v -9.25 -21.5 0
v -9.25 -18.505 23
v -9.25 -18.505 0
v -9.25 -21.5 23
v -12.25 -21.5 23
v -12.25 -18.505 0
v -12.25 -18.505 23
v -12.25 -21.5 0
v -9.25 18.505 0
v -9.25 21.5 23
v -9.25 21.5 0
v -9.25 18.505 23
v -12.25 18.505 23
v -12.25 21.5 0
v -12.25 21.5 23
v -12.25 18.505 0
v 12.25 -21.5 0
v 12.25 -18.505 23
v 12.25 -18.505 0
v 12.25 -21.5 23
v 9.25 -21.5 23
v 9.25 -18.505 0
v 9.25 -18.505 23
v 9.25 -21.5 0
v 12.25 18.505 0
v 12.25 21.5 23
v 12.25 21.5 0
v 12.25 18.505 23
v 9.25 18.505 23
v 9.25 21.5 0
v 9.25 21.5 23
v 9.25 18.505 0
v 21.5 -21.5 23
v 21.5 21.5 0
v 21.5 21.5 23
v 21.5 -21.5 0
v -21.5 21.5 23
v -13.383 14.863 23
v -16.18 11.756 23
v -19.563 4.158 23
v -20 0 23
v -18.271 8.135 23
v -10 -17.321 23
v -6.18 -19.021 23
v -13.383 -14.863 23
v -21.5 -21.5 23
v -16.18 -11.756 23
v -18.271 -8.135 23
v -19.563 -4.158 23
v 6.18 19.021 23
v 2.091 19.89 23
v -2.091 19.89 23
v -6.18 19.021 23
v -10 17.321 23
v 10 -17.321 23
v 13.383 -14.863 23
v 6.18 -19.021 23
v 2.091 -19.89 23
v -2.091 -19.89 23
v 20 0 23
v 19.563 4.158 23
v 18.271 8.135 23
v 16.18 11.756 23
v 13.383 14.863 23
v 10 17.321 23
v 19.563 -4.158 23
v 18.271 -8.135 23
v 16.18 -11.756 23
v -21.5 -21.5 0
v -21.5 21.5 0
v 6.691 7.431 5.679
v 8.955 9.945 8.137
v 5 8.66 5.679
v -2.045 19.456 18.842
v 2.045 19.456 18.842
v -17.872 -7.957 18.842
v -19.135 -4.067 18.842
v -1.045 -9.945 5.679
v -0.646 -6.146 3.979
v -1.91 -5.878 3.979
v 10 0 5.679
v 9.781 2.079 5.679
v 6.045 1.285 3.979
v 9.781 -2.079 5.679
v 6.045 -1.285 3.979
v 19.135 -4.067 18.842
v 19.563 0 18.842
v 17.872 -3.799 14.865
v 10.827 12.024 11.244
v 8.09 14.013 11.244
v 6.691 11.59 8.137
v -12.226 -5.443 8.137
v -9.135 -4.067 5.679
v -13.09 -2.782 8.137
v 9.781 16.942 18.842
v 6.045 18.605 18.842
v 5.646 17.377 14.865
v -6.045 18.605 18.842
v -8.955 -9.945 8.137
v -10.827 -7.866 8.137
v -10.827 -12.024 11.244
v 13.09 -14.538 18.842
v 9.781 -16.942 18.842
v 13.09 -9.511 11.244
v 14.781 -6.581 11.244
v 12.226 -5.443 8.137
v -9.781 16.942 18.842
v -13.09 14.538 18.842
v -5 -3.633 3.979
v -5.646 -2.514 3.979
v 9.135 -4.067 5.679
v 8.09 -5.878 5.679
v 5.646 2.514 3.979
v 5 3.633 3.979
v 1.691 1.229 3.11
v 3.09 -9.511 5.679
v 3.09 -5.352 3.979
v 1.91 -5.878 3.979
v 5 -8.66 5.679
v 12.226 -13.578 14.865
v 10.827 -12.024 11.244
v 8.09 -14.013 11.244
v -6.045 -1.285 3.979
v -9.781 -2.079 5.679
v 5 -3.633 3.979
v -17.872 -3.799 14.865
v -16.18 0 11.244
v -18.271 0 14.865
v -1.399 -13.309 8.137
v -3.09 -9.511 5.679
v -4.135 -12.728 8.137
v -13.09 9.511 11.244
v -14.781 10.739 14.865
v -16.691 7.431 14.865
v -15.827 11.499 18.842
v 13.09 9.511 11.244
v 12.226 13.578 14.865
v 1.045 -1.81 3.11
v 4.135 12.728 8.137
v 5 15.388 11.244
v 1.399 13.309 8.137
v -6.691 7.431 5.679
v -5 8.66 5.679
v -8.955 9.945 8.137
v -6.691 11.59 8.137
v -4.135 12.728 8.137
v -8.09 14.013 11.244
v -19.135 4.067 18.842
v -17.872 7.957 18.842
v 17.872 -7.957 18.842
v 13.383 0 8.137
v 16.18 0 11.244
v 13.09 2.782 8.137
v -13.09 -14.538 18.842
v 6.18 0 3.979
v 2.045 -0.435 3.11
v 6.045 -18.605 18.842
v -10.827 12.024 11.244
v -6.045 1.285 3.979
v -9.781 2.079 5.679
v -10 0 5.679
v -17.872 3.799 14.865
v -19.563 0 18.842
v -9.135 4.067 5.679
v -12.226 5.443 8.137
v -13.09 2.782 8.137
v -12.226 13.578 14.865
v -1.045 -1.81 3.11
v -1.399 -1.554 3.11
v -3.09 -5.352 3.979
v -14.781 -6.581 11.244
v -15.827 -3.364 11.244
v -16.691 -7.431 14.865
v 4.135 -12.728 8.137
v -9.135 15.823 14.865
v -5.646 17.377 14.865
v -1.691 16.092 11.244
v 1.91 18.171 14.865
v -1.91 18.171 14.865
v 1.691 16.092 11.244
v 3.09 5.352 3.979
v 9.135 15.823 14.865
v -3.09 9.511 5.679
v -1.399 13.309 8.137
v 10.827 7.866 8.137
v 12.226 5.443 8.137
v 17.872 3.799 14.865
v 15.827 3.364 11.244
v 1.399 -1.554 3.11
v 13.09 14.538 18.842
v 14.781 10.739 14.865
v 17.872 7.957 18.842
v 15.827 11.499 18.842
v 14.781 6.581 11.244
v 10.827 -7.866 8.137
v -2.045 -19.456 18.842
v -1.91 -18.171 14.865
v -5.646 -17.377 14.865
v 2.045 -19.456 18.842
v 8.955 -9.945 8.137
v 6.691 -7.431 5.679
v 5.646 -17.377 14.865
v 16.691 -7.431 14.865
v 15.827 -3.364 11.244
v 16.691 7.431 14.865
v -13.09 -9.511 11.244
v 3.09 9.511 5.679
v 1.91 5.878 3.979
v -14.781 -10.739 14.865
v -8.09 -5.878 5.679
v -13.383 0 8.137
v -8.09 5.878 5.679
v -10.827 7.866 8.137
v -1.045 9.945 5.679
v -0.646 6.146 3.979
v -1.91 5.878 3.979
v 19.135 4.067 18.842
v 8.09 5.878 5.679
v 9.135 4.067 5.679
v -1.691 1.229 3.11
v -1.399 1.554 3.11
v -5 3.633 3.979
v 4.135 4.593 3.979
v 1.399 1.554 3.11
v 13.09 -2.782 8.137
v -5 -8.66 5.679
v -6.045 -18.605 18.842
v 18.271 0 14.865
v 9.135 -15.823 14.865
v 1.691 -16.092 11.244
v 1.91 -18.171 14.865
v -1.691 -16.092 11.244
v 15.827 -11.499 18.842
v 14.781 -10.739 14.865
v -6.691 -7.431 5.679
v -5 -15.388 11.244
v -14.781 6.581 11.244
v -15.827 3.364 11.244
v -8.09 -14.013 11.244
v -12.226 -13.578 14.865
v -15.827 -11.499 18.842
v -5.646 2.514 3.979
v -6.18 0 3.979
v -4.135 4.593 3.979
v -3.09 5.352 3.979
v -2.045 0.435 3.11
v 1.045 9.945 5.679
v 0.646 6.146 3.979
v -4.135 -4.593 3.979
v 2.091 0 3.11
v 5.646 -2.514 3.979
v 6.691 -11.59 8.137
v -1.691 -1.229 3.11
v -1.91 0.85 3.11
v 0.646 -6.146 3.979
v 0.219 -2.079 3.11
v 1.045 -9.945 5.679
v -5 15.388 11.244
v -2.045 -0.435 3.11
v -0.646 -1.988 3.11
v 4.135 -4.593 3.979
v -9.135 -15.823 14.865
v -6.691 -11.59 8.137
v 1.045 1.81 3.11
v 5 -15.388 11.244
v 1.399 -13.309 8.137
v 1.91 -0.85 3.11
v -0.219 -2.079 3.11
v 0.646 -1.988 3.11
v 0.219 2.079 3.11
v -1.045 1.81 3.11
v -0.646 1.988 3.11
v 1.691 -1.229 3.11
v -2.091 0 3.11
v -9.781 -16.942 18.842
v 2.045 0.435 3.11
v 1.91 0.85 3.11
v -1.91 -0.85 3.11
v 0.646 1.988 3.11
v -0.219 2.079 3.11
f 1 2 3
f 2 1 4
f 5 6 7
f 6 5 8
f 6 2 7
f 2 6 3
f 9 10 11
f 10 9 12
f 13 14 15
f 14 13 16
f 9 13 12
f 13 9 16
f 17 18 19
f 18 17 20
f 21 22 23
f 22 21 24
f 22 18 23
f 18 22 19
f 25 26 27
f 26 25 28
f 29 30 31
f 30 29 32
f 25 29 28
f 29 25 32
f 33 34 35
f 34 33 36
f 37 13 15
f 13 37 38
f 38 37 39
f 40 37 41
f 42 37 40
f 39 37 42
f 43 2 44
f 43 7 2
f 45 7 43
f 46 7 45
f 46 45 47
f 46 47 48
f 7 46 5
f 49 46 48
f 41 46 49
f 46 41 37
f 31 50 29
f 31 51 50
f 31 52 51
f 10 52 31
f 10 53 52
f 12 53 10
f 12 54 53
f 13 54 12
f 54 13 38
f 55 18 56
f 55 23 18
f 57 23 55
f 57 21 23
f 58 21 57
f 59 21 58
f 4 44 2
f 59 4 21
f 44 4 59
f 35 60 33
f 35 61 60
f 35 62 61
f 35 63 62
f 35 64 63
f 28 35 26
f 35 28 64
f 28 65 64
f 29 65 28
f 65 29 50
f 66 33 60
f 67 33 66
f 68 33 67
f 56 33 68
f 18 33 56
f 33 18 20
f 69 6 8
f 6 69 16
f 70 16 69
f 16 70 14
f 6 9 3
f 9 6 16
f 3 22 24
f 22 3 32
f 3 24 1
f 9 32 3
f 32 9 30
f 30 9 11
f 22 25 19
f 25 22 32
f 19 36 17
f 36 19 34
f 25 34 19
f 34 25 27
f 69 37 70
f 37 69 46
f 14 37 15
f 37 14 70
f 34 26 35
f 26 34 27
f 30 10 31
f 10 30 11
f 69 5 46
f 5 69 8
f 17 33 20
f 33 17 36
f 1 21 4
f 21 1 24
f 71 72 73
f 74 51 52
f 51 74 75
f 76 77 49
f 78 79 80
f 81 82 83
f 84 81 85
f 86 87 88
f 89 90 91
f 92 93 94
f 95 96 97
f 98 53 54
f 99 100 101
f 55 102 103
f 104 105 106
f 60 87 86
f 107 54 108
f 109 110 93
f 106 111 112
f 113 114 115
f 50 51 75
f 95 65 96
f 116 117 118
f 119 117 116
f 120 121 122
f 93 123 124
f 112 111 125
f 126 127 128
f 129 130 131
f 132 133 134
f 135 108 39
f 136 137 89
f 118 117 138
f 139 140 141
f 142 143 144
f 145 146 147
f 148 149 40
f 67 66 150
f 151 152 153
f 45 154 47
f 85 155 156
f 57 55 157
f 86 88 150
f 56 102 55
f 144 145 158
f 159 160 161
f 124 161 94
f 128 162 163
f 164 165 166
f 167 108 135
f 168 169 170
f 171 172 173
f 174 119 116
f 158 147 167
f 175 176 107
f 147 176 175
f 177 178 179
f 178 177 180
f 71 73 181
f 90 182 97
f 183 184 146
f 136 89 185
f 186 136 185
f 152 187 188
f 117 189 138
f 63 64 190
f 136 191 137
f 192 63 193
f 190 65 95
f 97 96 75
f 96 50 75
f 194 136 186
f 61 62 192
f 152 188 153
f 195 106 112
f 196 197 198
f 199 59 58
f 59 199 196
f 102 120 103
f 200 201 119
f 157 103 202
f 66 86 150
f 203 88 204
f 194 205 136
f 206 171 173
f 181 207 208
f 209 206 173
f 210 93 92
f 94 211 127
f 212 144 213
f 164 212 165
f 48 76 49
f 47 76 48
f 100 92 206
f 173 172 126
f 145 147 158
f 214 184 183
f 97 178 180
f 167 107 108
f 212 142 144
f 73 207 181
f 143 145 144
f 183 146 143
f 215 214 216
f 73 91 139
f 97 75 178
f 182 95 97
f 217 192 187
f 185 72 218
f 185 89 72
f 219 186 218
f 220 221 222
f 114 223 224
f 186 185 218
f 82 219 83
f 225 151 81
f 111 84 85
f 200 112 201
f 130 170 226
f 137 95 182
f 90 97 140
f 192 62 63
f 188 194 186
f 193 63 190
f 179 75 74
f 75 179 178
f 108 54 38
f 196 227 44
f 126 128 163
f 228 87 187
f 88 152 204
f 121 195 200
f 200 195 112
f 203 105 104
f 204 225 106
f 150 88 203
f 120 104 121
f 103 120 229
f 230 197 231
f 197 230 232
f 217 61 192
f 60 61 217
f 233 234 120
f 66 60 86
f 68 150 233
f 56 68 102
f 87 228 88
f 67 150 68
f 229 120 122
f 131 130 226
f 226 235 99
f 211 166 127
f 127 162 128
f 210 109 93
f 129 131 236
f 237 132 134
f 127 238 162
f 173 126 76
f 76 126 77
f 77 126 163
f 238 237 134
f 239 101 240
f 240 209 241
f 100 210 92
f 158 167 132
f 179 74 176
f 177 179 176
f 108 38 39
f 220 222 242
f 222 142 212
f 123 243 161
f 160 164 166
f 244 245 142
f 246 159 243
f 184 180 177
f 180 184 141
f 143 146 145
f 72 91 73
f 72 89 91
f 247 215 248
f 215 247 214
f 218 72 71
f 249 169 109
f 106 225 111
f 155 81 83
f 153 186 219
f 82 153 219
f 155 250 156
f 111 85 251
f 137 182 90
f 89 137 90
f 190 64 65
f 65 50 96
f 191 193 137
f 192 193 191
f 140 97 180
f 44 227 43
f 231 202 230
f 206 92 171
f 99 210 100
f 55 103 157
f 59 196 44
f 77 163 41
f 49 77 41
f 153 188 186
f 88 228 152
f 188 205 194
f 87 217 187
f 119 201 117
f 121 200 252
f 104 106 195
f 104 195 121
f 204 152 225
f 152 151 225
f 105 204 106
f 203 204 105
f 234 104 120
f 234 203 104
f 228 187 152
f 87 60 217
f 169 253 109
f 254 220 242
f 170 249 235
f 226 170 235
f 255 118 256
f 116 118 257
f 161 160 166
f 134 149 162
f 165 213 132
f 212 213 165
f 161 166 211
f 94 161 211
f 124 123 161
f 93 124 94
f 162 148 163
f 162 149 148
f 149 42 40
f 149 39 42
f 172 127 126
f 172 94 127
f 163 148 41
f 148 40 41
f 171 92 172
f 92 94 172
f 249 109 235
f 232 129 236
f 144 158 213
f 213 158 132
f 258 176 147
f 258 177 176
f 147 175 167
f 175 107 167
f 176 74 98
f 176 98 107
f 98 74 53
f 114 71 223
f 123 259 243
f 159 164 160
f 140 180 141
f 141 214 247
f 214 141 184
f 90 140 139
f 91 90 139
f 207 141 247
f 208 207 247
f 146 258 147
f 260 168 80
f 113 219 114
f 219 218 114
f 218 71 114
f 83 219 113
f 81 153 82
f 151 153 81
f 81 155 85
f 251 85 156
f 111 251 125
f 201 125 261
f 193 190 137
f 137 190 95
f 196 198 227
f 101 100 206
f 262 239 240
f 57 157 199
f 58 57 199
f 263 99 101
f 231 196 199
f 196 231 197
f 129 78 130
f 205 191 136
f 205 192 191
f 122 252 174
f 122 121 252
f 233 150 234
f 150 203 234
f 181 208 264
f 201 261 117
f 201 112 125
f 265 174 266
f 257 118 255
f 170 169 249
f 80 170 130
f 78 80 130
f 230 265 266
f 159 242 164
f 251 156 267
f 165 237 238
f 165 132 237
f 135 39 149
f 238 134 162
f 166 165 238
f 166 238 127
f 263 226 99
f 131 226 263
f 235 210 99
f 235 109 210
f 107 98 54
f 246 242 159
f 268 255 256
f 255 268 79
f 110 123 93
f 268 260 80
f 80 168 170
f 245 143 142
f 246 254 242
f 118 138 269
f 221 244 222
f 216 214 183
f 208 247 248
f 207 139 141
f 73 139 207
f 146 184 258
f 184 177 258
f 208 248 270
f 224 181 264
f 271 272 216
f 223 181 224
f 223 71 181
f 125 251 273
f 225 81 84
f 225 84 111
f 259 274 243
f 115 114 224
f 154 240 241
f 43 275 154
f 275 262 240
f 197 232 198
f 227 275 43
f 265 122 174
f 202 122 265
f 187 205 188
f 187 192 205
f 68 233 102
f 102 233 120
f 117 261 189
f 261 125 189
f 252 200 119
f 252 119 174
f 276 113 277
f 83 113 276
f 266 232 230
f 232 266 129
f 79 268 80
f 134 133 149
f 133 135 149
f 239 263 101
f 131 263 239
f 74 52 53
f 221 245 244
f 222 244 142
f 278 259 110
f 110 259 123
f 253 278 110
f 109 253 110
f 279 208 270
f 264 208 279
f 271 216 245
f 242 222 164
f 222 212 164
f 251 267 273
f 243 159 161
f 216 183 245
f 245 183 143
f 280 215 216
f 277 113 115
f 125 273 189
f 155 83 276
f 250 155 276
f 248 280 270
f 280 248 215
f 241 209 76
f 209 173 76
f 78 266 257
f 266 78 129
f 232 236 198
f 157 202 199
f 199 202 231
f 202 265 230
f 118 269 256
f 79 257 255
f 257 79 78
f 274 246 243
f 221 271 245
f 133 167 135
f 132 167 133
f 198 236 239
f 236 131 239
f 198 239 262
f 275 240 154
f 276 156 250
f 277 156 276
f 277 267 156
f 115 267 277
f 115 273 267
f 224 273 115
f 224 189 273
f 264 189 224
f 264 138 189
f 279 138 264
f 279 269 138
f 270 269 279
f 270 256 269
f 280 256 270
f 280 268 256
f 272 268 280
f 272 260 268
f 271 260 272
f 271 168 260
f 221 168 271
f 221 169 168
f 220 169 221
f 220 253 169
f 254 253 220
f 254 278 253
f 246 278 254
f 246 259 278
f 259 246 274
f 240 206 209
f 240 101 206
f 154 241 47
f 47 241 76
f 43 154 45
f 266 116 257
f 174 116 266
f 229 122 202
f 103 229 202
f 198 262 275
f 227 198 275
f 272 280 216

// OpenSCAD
// file: cube_jig_common.scad
ball_diameter = 40.0;
wall = 3.0;
gap = 0;
e = 0.01;
slot = 3.0;
cube_size = [ball_diameter+wall,
             ball_diameter+wall,
             ball_diameter/2+wall-gap];

module jig() {
  difference() {
    translate([-cube_size[0]/2, -cube_size[1]/2, 0]) cube(cube_size);
    translate([0, 0, ball_diameter/2+wall]) sphere(d=ball_diameter);
    for (i = [-cube_size[0]/4, cube_size[0]/4]) {
        for (j = [(slot-cube_size[1]-e)/2, (e+cube_size[1]-slot)/2]) {
            translate([i,j,0]) cube([slot, slot, ball_diameter+wall*2+e], center=true);
        }
    }
  }
}

jig();
// main file
include <cube_jig_common.scad>;
sep = 9.0;
hole = 2.5;
ratio = 40/140;
difference() {
    jig();
    translate([-sep/2, sep/2,0]) cylinder(d=hole,h = 20, center=true);  
    translate([sep/2, -sep/2,0]) cylinder(d=hole,h = 20, center=true);  
    translate([sep*ratio-sep/2, sep*ratio-sep/2,0]) cylinder(d=hole,h = 20, center=true);  
}
